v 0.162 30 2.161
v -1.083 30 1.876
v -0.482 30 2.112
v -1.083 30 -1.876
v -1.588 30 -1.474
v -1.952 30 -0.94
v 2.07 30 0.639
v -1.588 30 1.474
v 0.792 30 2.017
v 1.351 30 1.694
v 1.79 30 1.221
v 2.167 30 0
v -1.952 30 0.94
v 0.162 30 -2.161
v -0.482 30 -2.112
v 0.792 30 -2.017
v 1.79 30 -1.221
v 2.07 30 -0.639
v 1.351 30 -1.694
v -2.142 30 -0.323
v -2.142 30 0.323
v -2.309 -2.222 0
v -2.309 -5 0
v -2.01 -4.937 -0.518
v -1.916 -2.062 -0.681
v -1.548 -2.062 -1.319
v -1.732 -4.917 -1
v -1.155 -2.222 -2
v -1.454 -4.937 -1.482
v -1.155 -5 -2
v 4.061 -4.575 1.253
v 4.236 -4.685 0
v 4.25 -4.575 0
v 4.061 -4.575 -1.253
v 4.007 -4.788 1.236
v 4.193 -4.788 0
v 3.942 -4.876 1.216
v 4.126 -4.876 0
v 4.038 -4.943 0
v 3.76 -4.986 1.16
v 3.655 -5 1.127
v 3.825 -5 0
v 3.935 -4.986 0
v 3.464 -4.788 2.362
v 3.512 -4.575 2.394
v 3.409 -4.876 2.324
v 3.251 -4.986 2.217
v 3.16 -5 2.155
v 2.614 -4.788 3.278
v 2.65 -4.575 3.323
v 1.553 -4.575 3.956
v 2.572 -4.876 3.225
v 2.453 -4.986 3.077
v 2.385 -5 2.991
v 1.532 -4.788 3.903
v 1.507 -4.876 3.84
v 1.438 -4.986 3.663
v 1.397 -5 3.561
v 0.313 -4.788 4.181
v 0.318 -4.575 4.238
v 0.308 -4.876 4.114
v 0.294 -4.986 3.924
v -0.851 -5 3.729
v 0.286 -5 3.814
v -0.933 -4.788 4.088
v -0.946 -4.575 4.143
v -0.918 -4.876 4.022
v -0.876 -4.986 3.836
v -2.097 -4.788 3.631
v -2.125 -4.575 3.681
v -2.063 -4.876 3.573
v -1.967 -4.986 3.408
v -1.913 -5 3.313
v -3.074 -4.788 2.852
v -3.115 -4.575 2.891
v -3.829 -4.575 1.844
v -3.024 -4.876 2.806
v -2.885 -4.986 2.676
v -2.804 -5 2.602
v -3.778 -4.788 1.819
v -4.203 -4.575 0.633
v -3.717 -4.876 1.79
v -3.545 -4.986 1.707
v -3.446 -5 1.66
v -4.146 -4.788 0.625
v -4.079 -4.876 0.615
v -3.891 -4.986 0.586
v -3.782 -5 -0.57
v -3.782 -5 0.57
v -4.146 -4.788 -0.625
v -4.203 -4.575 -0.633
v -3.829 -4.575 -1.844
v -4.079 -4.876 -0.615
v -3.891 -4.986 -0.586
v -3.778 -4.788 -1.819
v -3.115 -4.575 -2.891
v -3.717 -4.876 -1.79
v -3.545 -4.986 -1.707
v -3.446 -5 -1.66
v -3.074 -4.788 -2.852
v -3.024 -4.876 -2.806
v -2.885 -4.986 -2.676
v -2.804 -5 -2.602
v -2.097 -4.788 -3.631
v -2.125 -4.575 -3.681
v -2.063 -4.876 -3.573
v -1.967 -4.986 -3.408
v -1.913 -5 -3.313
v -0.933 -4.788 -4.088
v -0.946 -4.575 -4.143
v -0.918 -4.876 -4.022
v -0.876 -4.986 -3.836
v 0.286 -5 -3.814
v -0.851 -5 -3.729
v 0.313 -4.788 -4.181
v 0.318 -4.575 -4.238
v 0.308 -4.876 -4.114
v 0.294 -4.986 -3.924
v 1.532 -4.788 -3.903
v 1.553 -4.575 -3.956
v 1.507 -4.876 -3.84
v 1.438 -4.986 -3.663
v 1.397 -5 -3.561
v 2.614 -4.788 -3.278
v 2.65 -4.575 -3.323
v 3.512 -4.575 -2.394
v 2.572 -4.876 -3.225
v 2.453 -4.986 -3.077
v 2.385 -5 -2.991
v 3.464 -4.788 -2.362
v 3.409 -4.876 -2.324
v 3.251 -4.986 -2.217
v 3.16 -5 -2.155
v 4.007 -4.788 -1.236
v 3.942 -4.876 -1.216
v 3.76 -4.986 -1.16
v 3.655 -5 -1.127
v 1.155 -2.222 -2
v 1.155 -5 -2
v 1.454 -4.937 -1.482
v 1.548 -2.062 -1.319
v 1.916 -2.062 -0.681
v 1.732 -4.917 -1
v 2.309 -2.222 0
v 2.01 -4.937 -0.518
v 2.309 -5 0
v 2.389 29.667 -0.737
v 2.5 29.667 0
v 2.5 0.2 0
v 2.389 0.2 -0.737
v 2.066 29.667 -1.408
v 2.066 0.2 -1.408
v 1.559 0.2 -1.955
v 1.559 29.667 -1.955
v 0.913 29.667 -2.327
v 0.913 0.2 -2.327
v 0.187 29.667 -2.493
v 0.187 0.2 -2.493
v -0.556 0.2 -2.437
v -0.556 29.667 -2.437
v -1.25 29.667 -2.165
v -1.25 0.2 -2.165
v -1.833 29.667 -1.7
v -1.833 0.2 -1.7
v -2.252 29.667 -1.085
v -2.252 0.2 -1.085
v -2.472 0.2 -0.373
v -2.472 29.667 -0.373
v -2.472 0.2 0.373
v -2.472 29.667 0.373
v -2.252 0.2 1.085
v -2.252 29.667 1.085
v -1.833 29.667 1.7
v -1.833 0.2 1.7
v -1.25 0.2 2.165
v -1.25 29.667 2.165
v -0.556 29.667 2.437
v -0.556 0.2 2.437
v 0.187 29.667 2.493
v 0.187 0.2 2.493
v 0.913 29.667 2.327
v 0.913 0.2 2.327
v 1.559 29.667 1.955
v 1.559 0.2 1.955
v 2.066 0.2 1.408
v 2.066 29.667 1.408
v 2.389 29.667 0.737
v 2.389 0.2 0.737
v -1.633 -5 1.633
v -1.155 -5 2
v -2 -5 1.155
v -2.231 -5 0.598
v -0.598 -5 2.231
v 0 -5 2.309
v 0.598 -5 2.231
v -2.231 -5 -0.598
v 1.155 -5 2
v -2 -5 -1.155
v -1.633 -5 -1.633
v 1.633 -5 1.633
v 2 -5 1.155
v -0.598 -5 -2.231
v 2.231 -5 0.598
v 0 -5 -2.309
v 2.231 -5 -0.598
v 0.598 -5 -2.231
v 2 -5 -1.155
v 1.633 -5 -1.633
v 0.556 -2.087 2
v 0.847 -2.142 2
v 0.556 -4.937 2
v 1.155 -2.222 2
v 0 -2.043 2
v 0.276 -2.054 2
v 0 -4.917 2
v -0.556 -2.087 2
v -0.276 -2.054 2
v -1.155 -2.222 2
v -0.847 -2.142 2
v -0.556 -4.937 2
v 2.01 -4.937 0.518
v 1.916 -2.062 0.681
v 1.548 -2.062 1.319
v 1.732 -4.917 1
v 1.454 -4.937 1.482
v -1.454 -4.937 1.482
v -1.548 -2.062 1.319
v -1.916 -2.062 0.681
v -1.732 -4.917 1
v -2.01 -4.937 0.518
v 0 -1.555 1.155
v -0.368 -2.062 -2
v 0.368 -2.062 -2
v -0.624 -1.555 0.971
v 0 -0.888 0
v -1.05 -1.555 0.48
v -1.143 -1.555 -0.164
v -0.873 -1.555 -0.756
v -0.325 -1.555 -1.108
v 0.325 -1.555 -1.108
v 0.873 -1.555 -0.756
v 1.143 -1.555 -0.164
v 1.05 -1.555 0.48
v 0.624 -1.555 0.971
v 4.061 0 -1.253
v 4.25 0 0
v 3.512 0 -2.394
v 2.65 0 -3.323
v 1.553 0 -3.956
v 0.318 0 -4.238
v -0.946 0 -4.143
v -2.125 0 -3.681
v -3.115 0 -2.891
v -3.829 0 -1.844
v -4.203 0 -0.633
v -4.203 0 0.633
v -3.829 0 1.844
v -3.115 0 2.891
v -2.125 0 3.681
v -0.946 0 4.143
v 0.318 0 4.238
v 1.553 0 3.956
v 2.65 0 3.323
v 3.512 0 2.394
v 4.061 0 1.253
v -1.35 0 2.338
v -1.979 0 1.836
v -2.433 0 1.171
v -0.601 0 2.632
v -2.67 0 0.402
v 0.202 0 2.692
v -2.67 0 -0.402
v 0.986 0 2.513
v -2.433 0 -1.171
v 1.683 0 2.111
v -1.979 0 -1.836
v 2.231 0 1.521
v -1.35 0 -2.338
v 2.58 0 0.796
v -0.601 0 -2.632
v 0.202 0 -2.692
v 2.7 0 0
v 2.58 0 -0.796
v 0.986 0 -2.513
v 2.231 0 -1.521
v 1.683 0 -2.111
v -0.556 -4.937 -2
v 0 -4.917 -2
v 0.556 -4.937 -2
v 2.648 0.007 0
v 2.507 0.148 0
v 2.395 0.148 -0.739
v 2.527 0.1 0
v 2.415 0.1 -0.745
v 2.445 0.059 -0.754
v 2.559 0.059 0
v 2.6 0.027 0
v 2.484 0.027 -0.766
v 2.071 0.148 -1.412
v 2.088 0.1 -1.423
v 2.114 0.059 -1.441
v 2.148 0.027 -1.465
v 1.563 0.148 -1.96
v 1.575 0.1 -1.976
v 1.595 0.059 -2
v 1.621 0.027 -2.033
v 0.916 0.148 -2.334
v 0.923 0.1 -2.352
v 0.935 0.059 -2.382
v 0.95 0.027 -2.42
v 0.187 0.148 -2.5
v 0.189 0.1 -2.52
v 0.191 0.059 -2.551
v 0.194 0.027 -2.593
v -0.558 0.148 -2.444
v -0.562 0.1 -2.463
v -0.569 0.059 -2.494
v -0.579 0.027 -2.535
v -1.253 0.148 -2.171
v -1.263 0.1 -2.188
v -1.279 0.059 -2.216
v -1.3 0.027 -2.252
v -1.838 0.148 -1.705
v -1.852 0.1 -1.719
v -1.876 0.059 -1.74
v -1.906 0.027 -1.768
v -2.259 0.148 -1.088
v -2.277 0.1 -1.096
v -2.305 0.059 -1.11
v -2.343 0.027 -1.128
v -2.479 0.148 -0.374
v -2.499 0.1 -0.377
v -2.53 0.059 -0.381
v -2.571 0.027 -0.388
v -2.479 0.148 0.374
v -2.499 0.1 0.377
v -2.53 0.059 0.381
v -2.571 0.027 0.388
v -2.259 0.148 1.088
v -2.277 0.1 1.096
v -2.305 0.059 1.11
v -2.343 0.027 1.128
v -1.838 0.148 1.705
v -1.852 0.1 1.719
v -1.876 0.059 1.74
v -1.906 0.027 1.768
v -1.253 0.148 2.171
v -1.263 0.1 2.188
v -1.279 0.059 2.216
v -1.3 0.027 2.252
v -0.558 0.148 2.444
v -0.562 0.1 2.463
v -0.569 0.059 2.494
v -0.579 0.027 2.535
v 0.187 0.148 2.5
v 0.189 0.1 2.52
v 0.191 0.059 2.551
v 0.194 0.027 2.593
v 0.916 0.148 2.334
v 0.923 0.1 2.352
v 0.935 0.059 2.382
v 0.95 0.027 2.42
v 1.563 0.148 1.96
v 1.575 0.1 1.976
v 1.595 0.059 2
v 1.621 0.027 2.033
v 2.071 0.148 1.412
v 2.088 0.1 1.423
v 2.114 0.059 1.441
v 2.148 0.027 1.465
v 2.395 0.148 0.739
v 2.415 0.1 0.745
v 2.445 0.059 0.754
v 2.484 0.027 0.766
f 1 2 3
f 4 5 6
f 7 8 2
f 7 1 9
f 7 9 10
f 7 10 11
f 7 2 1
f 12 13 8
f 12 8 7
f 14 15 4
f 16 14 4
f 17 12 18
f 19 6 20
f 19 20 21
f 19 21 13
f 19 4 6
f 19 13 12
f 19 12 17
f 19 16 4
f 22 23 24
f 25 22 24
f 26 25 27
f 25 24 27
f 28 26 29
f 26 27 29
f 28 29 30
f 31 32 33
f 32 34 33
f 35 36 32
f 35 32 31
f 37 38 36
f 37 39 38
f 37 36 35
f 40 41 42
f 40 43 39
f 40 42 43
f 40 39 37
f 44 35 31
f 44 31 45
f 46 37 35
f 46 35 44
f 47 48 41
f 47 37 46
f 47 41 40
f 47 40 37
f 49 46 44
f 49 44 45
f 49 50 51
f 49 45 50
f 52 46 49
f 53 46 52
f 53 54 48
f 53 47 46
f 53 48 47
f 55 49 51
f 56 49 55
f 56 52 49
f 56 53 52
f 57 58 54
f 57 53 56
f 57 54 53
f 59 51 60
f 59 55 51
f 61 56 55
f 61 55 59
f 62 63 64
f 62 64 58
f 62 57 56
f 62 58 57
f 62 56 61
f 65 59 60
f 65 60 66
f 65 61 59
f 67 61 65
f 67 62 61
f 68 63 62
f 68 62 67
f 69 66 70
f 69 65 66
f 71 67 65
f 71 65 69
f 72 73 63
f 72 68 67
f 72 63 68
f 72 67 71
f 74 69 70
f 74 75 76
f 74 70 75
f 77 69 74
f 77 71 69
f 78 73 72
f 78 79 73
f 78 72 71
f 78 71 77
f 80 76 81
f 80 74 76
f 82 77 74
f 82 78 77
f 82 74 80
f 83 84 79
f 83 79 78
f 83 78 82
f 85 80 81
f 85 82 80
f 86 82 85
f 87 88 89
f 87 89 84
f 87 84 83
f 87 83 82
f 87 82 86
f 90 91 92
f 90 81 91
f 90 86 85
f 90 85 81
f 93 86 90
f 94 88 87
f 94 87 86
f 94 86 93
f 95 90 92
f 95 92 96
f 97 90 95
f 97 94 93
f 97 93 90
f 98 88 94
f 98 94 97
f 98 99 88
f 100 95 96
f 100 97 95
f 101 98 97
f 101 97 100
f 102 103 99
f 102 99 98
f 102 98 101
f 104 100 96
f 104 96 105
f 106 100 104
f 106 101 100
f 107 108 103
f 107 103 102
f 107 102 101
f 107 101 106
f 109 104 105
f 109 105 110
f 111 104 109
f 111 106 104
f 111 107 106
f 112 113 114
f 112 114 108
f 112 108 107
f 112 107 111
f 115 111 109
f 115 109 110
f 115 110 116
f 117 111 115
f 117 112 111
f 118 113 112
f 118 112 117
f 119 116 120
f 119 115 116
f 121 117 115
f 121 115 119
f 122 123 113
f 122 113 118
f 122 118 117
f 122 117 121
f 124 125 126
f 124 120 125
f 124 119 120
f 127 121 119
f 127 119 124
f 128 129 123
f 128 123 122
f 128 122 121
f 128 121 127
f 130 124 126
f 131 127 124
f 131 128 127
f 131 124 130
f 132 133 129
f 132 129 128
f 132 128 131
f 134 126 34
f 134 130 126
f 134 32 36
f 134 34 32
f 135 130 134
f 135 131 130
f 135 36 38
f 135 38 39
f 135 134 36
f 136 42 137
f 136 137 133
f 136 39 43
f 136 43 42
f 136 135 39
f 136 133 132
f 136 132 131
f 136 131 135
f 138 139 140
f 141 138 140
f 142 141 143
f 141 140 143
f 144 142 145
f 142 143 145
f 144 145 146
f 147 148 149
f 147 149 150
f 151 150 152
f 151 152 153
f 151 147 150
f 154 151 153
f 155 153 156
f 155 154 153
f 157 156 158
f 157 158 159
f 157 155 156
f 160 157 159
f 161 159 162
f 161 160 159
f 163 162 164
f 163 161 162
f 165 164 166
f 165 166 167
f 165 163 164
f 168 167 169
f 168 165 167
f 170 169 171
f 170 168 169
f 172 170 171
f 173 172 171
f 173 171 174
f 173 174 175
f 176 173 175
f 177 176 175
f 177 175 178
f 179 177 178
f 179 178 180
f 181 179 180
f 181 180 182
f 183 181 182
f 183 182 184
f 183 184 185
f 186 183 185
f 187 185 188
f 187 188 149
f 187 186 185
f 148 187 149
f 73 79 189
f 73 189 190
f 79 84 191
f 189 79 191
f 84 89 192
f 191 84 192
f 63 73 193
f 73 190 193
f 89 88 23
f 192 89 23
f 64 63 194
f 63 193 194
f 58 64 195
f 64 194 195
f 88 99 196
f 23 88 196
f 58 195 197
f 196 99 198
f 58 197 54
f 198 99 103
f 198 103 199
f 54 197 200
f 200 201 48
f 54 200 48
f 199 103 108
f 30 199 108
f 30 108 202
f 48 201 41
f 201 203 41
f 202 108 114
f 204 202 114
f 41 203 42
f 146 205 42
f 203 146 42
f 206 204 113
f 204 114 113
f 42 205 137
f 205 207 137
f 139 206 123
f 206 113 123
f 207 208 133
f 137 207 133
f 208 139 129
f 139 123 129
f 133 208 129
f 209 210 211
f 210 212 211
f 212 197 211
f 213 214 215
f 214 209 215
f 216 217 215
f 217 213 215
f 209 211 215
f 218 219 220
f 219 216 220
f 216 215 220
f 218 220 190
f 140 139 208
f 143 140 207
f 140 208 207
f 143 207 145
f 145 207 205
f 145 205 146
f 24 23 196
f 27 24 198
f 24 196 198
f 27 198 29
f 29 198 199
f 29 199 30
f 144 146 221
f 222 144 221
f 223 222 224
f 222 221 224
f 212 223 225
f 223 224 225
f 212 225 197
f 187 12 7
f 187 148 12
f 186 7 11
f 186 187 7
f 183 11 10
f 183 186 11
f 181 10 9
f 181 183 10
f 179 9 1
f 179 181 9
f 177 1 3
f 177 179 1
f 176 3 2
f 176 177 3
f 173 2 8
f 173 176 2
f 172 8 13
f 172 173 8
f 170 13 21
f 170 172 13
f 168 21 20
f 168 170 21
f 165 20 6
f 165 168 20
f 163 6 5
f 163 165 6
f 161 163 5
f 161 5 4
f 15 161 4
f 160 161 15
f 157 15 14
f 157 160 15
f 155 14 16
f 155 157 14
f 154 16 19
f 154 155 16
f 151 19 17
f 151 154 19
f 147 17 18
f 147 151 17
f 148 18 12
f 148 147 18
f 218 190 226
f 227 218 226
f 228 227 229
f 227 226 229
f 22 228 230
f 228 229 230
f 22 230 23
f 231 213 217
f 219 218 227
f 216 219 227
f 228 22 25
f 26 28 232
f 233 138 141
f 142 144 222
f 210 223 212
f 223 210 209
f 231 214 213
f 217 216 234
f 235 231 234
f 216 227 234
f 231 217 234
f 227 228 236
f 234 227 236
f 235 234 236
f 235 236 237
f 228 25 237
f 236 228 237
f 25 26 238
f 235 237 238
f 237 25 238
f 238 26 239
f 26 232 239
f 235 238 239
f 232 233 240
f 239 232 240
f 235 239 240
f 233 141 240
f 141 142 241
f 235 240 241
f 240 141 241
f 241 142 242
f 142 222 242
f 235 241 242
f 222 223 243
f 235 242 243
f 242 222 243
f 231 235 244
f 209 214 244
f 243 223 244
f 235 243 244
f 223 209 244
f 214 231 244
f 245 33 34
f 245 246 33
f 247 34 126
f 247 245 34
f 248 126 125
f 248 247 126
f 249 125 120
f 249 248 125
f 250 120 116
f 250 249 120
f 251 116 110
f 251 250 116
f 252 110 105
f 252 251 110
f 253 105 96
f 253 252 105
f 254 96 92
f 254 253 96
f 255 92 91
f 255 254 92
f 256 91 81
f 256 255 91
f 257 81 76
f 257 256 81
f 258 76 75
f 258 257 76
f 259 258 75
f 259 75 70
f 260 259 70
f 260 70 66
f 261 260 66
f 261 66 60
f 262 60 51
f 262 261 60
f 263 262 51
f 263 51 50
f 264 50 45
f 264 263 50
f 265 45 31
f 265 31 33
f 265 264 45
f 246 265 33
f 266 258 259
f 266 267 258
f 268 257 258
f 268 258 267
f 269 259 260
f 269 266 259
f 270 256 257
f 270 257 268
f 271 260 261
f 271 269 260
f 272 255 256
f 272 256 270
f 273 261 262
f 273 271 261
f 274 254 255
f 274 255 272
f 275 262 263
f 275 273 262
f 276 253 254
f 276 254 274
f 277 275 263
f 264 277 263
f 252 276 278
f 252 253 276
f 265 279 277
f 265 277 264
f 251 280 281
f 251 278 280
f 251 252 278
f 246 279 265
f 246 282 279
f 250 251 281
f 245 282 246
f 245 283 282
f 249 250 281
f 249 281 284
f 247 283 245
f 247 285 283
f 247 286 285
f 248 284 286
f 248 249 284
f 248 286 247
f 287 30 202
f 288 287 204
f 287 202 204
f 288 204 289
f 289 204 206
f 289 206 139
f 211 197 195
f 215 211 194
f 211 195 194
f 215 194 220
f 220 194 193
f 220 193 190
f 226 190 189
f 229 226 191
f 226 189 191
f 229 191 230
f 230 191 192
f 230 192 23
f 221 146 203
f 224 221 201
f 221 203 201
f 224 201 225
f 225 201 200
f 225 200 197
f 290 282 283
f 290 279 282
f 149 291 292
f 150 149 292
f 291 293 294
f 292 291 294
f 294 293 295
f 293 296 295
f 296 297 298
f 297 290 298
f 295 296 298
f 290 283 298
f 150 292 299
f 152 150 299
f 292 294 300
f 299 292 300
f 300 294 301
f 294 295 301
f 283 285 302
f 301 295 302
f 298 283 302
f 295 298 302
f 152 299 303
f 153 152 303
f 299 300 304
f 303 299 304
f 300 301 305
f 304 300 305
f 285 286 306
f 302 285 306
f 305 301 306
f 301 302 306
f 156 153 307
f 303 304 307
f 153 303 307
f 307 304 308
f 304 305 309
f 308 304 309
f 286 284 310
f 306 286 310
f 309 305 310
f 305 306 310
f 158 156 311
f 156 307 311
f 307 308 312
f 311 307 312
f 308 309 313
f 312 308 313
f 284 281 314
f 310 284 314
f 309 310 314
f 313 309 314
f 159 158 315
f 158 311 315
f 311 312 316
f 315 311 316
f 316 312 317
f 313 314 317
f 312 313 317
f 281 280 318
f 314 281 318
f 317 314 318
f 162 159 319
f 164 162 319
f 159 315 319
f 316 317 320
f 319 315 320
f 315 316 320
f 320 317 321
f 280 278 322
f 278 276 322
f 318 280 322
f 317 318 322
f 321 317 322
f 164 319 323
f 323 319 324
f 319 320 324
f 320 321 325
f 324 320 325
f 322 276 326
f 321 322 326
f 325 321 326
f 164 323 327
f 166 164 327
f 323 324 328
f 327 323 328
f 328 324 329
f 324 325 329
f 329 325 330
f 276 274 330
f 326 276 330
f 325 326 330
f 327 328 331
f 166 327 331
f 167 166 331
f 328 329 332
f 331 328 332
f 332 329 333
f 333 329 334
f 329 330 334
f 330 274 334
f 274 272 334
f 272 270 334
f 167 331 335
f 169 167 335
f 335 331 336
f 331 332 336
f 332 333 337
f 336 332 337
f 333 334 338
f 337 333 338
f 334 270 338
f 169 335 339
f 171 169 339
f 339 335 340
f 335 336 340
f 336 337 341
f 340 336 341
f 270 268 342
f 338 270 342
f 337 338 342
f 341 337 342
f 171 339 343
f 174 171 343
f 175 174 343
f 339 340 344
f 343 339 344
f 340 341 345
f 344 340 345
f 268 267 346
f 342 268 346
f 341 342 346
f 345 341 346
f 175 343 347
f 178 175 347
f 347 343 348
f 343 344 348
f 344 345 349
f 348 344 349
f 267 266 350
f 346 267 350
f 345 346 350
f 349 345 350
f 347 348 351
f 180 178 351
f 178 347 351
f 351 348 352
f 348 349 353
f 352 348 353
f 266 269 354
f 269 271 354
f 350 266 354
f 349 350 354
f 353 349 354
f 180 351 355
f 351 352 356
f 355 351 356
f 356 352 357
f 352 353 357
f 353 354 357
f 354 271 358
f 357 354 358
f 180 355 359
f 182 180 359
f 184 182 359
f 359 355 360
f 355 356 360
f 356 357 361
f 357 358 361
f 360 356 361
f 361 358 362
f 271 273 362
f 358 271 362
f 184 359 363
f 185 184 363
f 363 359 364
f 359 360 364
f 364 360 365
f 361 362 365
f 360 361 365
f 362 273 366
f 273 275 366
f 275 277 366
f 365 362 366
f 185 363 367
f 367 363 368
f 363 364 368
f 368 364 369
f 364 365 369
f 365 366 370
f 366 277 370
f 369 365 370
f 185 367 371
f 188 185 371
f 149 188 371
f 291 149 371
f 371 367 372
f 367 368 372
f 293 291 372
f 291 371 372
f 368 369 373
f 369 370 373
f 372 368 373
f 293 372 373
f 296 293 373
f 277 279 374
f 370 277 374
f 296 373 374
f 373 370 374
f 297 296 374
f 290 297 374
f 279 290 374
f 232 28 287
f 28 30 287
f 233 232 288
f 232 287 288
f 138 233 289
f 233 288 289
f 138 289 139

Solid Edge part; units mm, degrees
sketch "Sketch1" plane through (0, 0, 0) normal (0, 0, 1) x (1, 0, 0)
  line L0 (2.5, 0) -> (2.5, 30)
  line L1 (0, 30) -> (2.5, 30)
  line L2 (0, 0) -> (0, 30)
  line L3 (0, 0) -> (0, -5)
  line L4 (0, -5) -> (4.25, -5)
  line L5 (4.25, -5) -> (4.25, 0)
  line L6 (4.25, 0) -> (2.5, 0)
revolve "RevolvedProtrusion1" add sketch "Sketch1" angle 360 about axis through (0, 0, 0) along (0, 1, 0)
sketch "Sketch2" plane through (0, 0, 0) normal (1, 0, 0) x (0, 1, 0)
  line L0 (-5, 2.7915) -> (-2.5, 2.7915)
  line L1 (-0.8883, 0) -> (-2.5, 2.7915)
  line L2 (-5, 0) -> (-0.8883, 0)
  line L3 (-5, 0) -> (-5, 2.7915)
revolve "RevolvedCutout1" cut sketch "Sketch2" angle 360 about axis through (0, -4.5, 0) along (0, 1, 0)
sketch "Sketch3" plane through (0, -5, 0) normal (0, -1, 0) x (0, 0, 1)
  circle A0 centre (0, 0) radius 2.7915
  line L0 (-2, -1.1547) -> (0, -2.3094)
  line L1 (0, -2.3094) -> (2, -1.1547)
  line L2 (2, -1.1547) -> (2, 1.1547)
  line L3 (2, 1.1547) -> (0, 2.3094)
  line L4 (0, 2.3094) -> (-2, 1.1547)
  line L5 (-2, 1.1547) -> (-2, -1.1547)
  dimension "D1" = 4
extrude "Protrusion1" add sketch "Sketch3" against normal up to next
sketch "Sketch4" plane through (0, 0, 0) normal (0, 0, 1) x (1, 0, 0)
  line L0 (-2.3094, -5) -> (0, -5)
  line L1 (0, -5) -> (0, -4.3812)
  line L2 (0, -4.3812) -> (-2.3094, -5)
revolve "RevolvedCutout2" cut sketch "Sketch4" angle 360 about axis through (0, -4.5, 0) along (0, 1, 0)
fillet "Round1" radius 0.2 1 edges at (0, 0, -2.5)
fillet "Round2" radius 0.425 1 edges at (0, -5, -4.25)
chamfer "倒斜角_2" distance 0.3333 angle 45 1 edges at (0, 30, -2.5)
cosmetic_thread "螺纹_3" size "M5" thread depth 24
properties part number "N2611-1313" material "铝 1060"
